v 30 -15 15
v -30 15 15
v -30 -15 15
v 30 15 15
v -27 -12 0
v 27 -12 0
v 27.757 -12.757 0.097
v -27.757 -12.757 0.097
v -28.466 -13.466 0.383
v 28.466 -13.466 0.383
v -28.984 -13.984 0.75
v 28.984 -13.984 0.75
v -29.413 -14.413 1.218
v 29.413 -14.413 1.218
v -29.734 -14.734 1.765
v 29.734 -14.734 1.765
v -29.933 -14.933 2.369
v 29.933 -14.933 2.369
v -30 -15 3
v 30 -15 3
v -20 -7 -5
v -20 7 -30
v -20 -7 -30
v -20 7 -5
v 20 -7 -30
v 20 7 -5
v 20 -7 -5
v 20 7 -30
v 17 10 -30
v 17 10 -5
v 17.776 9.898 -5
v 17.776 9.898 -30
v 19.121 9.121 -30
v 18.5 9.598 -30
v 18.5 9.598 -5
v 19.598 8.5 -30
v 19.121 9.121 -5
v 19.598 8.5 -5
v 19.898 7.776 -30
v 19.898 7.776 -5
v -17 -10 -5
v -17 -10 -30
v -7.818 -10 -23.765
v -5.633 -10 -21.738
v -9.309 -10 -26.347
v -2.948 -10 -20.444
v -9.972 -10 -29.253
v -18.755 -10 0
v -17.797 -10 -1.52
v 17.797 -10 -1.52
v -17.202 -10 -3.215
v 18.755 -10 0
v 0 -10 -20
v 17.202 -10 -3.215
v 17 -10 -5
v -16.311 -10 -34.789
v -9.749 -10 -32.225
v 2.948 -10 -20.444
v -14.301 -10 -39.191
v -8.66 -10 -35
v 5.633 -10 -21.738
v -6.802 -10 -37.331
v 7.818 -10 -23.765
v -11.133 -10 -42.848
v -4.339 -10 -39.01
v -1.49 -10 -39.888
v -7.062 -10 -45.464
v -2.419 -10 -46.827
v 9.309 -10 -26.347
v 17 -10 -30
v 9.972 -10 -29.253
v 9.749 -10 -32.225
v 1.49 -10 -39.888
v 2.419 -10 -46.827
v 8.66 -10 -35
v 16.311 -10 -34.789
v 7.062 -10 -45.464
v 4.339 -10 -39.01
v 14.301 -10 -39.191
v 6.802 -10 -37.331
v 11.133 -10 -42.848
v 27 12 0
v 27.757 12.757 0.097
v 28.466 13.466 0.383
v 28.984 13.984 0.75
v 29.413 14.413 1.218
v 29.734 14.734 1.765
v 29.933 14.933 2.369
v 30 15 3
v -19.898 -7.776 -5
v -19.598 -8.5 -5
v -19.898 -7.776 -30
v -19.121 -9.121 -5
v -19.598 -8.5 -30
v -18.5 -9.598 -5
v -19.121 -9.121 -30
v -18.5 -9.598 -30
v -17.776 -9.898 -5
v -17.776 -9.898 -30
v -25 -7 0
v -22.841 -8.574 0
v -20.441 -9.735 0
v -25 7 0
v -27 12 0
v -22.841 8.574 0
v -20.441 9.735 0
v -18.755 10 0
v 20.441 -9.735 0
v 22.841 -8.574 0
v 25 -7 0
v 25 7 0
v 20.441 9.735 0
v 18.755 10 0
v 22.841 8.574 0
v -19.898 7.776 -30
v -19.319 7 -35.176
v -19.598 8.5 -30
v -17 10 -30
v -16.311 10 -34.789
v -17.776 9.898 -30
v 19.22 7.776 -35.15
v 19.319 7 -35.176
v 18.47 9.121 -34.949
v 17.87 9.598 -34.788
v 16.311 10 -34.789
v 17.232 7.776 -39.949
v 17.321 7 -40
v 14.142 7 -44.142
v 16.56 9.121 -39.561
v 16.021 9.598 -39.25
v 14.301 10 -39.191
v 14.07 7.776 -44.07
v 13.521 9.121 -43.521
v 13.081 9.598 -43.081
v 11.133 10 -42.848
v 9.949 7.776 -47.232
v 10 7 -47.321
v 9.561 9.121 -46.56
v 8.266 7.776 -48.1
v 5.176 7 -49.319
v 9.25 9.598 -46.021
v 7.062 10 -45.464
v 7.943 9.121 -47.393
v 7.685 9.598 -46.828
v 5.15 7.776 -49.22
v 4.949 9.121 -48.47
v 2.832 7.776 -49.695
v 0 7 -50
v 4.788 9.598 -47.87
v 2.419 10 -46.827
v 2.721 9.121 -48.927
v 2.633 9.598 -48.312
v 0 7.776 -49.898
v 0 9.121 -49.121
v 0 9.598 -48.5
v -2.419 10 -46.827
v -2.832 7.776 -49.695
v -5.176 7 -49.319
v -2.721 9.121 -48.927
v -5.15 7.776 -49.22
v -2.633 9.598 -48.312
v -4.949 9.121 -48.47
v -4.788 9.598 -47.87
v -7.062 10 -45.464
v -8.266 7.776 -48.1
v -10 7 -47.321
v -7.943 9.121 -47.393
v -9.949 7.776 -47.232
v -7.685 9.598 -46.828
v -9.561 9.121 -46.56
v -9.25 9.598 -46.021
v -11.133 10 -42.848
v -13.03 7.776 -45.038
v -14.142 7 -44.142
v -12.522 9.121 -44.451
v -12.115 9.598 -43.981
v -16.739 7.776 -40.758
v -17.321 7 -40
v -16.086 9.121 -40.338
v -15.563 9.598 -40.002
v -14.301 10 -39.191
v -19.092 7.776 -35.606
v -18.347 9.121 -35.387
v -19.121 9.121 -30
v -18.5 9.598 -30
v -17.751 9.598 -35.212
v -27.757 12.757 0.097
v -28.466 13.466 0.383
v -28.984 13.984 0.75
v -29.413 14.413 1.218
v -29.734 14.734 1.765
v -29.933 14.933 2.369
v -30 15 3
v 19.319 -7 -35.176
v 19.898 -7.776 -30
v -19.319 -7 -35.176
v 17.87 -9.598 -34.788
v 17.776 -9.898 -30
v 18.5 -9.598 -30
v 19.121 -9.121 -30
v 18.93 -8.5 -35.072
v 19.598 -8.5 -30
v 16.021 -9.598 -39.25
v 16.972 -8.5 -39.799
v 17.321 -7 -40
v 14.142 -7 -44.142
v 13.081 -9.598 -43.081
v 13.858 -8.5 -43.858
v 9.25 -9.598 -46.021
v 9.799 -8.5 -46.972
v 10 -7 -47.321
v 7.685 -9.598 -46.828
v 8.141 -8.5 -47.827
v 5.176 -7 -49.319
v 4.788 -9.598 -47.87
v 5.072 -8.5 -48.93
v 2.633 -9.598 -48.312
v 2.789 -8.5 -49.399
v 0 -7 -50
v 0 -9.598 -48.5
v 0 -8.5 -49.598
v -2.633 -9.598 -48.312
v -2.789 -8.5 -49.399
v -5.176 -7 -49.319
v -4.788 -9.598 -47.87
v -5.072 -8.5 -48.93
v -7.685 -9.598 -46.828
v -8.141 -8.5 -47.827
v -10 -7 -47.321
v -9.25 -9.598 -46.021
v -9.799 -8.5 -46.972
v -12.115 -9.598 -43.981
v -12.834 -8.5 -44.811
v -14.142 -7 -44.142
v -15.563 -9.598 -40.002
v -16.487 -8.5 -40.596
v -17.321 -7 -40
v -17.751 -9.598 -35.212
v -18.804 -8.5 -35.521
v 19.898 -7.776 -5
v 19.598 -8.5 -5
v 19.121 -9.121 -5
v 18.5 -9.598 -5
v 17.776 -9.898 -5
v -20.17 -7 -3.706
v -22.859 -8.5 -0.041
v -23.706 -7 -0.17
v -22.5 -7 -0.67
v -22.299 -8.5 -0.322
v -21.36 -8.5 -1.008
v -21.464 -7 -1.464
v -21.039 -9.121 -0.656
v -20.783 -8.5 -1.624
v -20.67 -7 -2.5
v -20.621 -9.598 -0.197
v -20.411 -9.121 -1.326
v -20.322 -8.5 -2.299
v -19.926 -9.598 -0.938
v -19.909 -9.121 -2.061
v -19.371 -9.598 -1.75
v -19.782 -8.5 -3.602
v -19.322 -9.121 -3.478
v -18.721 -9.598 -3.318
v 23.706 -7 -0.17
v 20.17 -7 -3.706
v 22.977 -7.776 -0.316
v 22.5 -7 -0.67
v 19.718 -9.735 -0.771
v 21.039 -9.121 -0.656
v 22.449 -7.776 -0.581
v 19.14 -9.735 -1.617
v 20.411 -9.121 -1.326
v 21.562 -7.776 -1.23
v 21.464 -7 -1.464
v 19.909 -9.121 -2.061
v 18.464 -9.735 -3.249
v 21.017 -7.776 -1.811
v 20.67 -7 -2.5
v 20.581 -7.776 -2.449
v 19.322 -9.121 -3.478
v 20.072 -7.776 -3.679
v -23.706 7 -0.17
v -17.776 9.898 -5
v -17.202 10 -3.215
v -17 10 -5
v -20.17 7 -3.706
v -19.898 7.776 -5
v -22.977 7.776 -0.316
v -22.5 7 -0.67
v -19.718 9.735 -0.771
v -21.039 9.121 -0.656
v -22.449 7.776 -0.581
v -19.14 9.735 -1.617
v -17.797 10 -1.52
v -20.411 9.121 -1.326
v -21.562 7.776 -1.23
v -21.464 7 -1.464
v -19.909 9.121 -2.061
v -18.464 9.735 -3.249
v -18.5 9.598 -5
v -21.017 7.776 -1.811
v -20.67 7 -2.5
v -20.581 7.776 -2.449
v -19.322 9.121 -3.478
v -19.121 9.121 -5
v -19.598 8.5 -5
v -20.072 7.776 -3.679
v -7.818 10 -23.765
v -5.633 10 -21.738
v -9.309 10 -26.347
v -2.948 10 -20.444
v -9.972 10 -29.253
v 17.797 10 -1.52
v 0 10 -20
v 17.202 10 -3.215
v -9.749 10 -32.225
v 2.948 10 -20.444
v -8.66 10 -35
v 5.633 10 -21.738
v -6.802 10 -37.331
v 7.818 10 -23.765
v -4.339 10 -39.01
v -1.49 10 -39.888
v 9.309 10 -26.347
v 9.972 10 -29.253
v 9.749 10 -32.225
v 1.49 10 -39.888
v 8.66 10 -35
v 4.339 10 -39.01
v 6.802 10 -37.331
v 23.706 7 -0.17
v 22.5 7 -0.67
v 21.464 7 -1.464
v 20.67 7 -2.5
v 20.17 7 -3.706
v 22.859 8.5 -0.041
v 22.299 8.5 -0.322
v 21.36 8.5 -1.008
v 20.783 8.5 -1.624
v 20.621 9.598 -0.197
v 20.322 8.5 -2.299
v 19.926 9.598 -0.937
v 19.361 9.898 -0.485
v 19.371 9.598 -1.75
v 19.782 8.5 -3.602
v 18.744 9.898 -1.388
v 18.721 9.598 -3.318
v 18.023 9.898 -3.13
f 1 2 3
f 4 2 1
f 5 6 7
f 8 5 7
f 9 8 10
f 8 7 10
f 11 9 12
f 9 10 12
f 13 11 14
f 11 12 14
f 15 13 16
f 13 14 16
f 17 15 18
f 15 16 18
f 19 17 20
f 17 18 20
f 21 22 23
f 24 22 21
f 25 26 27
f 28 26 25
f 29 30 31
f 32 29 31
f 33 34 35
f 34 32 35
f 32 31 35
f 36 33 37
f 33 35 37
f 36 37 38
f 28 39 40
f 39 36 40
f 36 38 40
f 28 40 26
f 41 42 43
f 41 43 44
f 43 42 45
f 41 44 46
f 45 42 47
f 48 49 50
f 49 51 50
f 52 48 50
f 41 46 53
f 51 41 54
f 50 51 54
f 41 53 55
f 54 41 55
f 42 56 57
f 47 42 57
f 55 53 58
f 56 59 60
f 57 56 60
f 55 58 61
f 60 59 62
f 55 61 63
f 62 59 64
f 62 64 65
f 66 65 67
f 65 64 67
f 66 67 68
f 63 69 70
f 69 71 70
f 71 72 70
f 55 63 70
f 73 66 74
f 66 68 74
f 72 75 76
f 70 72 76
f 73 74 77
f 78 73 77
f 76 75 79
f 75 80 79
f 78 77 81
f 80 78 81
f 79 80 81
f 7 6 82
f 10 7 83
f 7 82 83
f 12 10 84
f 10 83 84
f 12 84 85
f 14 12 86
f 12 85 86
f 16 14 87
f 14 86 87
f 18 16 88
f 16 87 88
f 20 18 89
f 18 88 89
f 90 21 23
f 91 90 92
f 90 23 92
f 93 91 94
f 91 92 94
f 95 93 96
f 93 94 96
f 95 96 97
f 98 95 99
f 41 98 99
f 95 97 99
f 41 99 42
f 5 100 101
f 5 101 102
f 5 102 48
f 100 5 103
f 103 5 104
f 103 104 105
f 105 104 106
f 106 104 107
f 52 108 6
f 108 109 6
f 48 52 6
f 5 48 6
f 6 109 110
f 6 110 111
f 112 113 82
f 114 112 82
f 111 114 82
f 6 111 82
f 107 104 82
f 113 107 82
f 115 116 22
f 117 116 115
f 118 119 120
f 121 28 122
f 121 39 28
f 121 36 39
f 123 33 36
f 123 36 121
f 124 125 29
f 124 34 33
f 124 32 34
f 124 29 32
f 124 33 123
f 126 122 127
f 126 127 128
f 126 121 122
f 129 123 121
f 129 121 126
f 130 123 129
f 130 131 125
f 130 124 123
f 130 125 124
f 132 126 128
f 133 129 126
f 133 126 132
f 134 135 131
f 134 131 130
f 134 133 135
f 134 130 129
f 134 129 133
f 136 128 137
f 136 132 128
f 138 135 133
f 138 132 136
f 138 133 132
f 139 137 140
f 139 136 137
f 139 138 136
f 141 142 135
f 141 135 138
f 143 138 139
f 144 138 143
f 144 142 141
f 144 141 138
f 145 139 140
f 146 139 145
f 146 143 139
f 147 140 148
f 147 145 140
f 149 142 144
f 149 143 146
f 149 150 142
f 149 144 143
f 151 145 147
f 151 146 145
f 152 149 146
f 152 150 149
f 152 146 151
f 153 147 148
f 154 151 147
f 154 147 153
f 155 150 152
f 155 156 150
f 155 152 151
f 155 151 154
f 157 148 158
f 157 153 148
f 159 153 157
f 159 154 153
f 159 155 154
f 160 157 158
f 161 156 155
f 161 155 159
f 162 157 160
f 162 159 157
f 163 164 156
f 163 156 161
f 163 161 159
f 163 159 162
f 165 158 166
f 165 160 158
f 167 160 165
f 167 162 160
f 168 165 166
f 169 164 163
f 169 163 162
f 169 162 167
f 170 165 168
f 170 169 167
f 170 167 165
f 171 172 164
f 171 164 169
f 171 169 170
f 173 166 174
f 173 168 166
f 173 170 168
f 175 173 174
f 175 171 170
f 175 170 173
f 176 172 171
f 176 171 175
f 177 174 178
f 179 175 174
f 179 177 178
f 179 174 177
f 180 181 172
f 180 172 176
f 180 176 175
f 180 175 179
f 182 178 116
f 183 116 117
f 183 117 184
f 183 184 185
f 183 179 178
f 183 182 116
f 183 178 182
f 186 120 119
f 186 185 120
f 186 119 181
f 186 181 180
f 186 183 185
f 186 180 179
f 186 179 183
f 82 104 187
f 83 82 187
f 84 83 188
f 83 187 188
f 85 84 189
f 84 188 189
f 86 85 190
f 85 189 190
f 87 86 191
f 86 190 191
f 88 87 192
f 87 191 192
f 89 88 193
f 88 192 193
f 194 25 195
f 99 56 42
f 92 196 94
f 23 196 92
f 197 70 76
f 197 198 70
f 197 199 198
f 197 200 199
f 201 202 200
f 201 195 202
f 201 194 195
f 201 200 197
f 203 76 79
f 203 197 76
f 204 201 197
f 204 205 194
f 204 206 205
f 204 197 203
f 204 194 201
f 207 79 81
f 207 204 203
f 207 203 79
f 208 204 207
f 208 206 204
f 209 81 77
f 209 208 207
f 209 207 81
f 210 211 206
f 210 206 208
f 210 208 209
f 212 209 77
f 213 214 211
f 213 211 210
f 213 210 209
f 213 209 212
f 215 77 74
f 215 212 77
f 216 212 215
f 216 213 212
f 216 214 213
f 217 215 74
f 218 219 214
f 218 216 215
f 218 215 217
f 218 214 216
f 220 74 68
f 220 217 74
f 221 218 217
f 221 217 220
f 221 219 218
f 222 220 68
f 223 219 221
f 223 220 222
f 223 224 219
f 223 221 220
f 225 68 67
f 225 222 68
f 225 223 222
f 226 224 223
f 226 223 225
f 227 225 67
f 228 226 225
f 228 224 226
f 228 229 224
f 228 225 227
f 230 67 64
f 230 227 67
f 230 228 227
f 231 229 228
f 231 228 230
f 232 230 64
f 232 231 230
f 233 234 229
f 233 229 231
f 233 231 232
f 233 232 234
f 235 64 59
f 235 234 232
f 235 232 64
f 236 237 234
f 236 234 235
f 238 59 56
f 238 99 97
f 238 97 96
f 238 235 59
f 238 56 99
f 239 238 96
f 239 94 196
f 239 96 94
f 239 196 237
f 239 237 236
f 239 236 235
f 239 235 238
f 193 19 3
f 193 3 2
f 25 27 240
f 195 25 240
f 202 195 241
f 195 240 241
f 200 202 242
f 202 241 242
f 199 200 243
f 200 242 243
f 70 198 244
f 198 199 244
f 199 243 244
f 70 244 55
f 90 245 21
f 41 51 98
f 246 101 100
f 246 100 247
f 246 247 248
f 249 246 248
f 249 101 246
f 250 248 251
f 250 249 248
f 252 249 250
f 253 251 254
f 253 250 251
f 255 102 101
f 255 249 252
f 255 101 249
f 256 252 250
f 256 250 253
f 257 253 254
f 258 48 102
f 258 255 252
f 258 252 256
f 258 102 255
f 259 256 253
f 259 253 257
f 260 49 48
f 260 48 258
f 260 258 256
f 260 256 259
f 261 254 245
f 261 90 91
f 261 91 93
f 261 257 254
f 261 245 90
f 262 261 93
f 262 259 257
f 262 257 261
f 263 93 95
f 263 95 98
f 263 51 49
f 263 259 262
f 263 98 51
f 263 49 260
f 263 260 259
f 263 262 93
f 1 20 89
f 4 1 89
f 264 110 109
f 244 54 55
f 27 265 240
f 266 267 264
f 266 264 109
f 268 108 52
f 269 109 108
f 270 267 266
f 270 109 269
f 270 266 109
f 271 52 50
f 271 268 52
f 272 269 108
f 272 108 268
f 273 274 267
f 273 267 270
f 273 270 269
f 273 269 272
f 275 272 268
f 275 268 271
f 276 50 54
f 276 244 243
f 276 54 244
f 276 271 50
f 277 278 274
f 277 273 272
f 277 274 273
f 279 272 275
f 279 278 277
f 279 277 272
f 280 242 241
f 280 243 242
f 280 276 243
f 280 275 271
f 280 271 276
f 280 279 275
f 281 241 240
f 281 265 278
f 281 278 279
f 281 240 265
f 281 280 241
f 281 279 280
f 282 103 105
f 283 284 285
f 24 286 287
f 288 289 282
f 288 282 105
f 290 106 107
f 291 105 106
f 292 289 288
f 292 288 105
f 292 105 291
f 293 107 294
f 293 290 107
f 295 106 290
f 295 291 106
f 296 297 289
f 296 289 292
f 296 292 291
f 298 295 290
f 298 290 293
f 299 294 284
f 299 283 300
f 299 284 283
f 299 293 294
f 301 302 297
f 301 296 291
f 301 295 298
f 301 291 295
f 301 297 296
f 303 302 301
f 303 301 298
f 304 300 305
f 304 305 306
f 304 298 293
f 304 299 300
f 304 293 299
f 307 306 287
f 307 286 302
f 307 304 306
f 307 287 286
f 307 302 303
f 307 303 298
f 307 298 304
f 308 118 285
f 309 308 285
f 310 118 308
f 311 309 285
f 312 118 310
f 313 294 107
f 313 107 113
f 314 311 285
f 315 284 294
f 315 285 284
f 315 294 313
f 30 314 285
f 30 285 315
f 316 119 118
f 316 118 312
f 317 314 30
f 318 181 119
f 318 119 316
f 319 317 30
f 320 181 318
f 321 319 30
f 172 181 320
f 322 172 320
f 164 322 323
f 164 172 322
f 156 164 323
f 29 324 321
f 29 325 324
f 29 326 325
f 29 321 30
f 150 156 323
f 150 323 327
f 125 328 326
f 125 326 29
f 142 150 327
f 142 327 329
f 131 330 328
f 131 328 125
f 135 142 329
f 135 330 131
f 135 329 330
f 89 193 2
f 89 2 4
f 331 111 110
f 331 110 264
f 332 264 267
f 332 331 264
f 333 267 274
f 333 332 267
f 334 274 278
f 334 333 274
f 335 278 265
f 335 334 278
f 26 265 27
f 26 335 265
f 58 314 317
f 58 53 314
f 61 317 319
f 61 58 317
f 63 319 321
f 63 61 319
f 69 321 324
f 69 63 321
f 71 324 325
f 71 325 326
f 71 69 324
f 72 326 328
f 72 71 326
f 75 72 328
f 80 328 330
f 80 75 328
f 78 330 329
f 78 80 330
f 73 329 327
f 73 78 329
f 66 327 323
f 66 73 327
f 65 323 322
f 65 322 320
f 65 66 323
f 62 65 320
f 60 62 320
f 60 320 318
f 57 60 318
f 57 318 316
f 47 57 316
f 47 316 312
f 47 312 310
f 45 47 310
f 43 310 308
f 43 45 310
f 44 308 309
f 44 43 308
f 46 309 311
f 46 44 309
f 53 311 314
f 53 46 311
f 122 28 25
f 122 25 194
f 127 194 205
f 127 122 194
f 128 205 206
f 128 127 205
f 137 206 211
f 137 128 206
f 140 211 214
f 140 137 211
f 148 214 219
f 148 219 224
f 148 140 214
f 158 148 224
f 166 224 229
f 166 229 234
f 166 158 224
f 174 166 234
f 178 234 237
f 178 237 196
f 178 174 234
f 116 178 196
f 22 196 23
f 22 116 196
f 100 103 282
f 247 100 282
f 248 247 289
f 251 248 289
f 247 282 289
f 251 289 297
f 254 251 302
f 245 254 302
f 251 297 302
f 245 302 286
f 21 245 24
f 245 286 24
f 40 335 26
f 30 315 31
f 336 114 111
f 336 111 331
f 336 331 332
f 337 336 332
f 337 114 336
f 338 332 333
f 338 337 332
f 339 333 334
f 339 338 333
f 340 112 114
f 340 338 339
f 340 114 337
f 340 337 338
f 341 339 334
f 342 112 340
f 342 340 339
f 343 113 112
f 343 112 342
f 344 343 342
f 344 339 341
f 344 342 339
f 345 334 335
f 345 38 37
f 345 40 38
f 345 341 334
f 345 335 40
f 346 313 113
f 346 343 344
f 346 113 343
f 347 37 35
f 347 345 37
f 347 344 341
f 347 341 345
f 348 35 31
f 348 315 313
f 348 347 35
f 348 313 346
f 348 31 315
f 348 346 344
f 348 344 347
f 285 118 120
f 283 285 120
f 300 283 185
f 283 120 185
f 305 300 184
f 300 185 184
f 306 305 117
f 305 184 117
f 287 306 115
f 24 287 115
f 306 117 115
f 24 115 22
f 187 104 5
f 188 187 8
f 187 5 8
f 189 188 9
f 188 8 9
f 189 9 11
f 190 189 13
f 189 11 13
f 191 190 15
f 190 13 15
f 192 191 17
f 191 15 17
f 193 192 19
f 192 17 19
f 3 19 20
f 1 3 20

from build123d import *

# Parameters (mm, degrees)
SKETCH1_W           = 60
SKETCH1_H           = 30
BOSS_EXTRUDE1_DEPTH = 15
SKETCH2_R           = 10
BOSS_EXTRUDE2_DEPTH = 10
FILLET1_R           = 5
FILLET2_R           = 3


with BuildPart() as part:
    # Sketch1 → Boss-Extrude1 (new body)
    with BuildSketch(Plane.XY):
        Rectangle(SKETCH1_W, SKETCH1_H)
    extrude(amount=BOSS_EXTRUDE1_DEPTH)

    # Sketch2 → Boss-Extrude2 (add, symmetric)
    with BuildSketch(Plane(origin=(0, 0, 0), x_dir=(1, 0, 0), z_dir=(0, 1, 0))):
        with BuildLine():
            Line((-20, 30), (-20, 0))
            Line((-20, 0), (20, 0))
            Line((20, 0), (20, 30))
            ThreePointArc((20, 30), (0, 50), (-20, 30))
        make_face()
        with Locations(Location((0, 30, 0), (0, 0, 270))):
            Circle(SKETCH2_R, mode=Mode.SUBTRACT)
    extrude(amount=BOSS_EXTRUDE2_DEPTH, both=True)

    # Fillet1
    fillet1_edges = [part.edges().sort_by_distance(p)[0] for p in [
        (-20, 0, 0),
        (20, 0, 0),
    ]]
    fillet(fillet1_edges, radius=FILLET1_R)

    # Fillet2
    # the kernel refuses this fillet: 3 mm, written as the material it takes off along each edge
    with BuildSketch(Plane(origin=(0, 10, -30), x_dir=(1, 0, 0), z_dir=(0, 0, 1))) as fillet2_piece_1:
        with BuildLine():
            CenterArc((20 - FILLET2_R, -FILLET2_R), FILLET2_R, 0, 90)
            Line((20 - FILLET2_R, 0), (20, 0))
            Line((20, 0), (20, -FILLET2_R))
        make_face()
    revolve(axis=Axis((0, 10, -30), (0, 1, 0)), revolution_arc=180, mode=Mode.SUBTRACT)
    with BuildSketch(Plane(origin=(-20, 10, -30), x_dir=(0, -1, 0), z_dir=(0, 0, 1)), Plane(origin=(20, 10, -5), x_dir=(0, -1, 0), z_dir=(0, 0, -1))) as fillet2_piece_2:
        with BuildLine():
            CenterArc((FILLET2_R, FILLET2_R), FILLET2_R, 180, 90)
            Line((0, FILLET2_R), (0, 0))
            Line((0, 0), (FILLET2_R, 0))
        make_face()
    extrude(amount=25, mode=Mode.SUBTRACT)
    with BuildSketch(Plane(origin=(0, -10, -30), x_dir=(1, 0, 0), z_dir=(0, 0, 1))) as fillet2_piece_3:
        with BuildLine():
            CenterArc((20 - FILLET2_R, FILLET2_R), FILLET2_R, 270, 90)
            Line((20 - FILLET2_R, 0), (20, 0))
            Line((20, 0), (20, FILLET2_R))
        make_face()
    revolve(axis=Axis((0, -10, -30), (0, 1, 0)), revolution_arc=180, mode=Mode.SUBTRACT)
    with BuildSketch(Plane(origin=(-20, -10, -30), x_dir=(0, 1, 0), z_dir=(0, 0, 1)), Plane(origin=(20, -10, -5), x_dir=(0, 1, 0), z_dir=(0, 0, -1))) as fillet2_piece_4:
        with BuildLine():
            CenterArc((FILLET2_R, -FILLET2_R), FILLET2_R, 90, 90)
            Line((0, -FILLET2_R), (0, 0))
            Line((0, 0), (FILLET2_R, 0))
        make_face()
    extrude(amount=25, mode=Mode.SUBTRACT)
    with BuildSketch(Plane(origin=(25, -10, -5), x_dir=(0.9975374290817743, 0, 0.07013613605641604), z_dir=(0.07013613605641604, 0, -0.9975374290817743))) as fillet2_piece_5_section:
        with BuildLine():
            CenterArc((5 + FILLET2_R, -FILLET2_R), FILLET2_R, 90, 90)
            Line((5 + FILLET2_R, 0), (5, 0))
            Line((5, 0), (5, -FILLET2_R))
        make_face()
    fillet2_piece_5 = revolve(axis=Axis((25, -10, -5), (0, -1, 0)), revolution_arc=175.978193542, mode=Mode.PRIVATE)
    fillet2_piece_5 = split(fillet2_piece_5, bisect_by=Plane(origin=(21.314130097, -9.156886231, 0), z_dir=(0, 0, -1)), keep=Keep.TOP, mode=Mode.PRIVATE)
    add(fillet2_piece_5, mode=Mode.SUBTRACT)
    with BuildSketch(Plane(origin=(25, 10, -5), x_dir=(0.9975374290817743, 0, 0.07013613605641604), z_dir=(0.07013613605641604, 0, -0.9975374290817743))) as fillet2_piece_6_section:
        with BuildLine():
            CenterArc((5 + FILLET2_R, FILLET2_R), FILLET2_R, 180, 90)
            Line((5, FILLET2_R), (5, 0))
            Line((5, 0), (5 + FILLET2_R, 0))
        make_face()
    fillet2_piece_6 = revolve(axis=Axis((25, 10, -5), (0, -1, 0)), revolution_arc=175.978193542, mode=Mode.PRIVATE)
    fillet2_piece_6 = split(fillet2_piece_6, bisect_by=Plane(origin=(21.314129988, 9.156886191, 0), z_dir=(0, 0, -1)), keep=Keep.TOP, mode=Mode.PRIVATE)
    add(fillet2_piece_6, mode=Mode.SUBTRACT)
    with BuildSketch(Plane(origin=(-25, -10, -5), x_dir=(-0.9975374290817743, 0, 0.07013613605641587), z_dir=(-0.07013613605641587, 0, -0.9975374290817743))) as fillet2_piece_7_section:
        with BuildLine():
            CenterArc((5 + FILLET2_R, FILLET2_R), FILLET2_R, 180, 90)
            Line((5 + FILLET2_R, 0), (5, 0))
            Line((5, 0), (5, FILLET2_R))
        make_face()
    fillet2_piece_7 = revolve(axis=Axis((-25, -10, -5), (0, 1, 0)), revolution_arc=175.978193542, mode=Mode.PRIVATE)
    fillet2_piece_7 = split(fillet2_piece_7, bisect_by=Plane(origin=(-21.314129744, -9.156885957, 0), z_dir=(0, 0, -1)), keep=Keep.TOP, mode=Mode.PRIVATE)
    add(fillet2_piece_7, mode=Mode.SUBTRACT)
    with BuildSketch(Plane(origin=(-25, 10, -5), x_dir=(-0.9975374290817743, 0, 0.07013613605641587), z_dir=(-0.07013613605641587, 0, -0.9975374290817743))) as fillet2_piece_8_section:
        with BuildLine():
            CenterArc((5 + FILLET2_R, -FILLET2_R), FILLET2_R, 90, 90)
            Line((5 + FILLET2_R, 0), (5, 0))
            Line((5, 0), (5, -FILLET2_R))
        make_face()
    fillet2_piece_8 = revolve(axis=Axis((-25, 10, -5), (0, 1, 0)), revolution_arc=175.978193542, mode=Mode.PRIVATE)
    fillet2_piece_8 = split(fillet2_piece_8, bisect_by=Plane(origin=(-21.314129744, 9.156885957, 0), z_dir=(0, 0, -1)), keep=Keep.TOP, mode=Mode.PRIVATE)
    add(fillet2_piece_8, mode=Mode.SUBTRACT)
    with BuildSketch(Plane(origin=(37.5, -15, 0), x_dir=(0, 1, 0), z_dir=(-1, 0, 0)), Plane(origin=(-37.5, 15, 0), x_dir=(0, -1, 0), z_dir=(1, 0, 0))) as fillet2_piece_9:
        with BuildLine():
            CenterArc((FILLET2_R, -FILLET2_R), FILLET2_R, 90, 90)
            Line((0, -FILLET2_R), (0, 0))
            Line((0, 0), (FILLET2_R, 0))
        make_face()
    extrude(amount=75, mode=Mode.SUBTRACT)
    with BuildSketch(Plane(origin=(-30, -22.5, 0), x_dir=(1, 0, 0), z_dir=(0, 1, 0)), Plane(origin=(30, 22.5, 0), x_dir=(-1, 0, 0), z_dir=(0, -1, 0))) as fillet2_piece_10:
        with BuildLine():
            CenterArc((FILLET2_R, -FILLET2_R), FILLET2_R, 90, 90)
            Line((0, -FILLET2_R), (0, 0))
            Line((0, 0), (FILLET2_R, 0))
        make_face()
    extrude(amount=45, mode=Mode.SUBTRACT)


solid = part.part
